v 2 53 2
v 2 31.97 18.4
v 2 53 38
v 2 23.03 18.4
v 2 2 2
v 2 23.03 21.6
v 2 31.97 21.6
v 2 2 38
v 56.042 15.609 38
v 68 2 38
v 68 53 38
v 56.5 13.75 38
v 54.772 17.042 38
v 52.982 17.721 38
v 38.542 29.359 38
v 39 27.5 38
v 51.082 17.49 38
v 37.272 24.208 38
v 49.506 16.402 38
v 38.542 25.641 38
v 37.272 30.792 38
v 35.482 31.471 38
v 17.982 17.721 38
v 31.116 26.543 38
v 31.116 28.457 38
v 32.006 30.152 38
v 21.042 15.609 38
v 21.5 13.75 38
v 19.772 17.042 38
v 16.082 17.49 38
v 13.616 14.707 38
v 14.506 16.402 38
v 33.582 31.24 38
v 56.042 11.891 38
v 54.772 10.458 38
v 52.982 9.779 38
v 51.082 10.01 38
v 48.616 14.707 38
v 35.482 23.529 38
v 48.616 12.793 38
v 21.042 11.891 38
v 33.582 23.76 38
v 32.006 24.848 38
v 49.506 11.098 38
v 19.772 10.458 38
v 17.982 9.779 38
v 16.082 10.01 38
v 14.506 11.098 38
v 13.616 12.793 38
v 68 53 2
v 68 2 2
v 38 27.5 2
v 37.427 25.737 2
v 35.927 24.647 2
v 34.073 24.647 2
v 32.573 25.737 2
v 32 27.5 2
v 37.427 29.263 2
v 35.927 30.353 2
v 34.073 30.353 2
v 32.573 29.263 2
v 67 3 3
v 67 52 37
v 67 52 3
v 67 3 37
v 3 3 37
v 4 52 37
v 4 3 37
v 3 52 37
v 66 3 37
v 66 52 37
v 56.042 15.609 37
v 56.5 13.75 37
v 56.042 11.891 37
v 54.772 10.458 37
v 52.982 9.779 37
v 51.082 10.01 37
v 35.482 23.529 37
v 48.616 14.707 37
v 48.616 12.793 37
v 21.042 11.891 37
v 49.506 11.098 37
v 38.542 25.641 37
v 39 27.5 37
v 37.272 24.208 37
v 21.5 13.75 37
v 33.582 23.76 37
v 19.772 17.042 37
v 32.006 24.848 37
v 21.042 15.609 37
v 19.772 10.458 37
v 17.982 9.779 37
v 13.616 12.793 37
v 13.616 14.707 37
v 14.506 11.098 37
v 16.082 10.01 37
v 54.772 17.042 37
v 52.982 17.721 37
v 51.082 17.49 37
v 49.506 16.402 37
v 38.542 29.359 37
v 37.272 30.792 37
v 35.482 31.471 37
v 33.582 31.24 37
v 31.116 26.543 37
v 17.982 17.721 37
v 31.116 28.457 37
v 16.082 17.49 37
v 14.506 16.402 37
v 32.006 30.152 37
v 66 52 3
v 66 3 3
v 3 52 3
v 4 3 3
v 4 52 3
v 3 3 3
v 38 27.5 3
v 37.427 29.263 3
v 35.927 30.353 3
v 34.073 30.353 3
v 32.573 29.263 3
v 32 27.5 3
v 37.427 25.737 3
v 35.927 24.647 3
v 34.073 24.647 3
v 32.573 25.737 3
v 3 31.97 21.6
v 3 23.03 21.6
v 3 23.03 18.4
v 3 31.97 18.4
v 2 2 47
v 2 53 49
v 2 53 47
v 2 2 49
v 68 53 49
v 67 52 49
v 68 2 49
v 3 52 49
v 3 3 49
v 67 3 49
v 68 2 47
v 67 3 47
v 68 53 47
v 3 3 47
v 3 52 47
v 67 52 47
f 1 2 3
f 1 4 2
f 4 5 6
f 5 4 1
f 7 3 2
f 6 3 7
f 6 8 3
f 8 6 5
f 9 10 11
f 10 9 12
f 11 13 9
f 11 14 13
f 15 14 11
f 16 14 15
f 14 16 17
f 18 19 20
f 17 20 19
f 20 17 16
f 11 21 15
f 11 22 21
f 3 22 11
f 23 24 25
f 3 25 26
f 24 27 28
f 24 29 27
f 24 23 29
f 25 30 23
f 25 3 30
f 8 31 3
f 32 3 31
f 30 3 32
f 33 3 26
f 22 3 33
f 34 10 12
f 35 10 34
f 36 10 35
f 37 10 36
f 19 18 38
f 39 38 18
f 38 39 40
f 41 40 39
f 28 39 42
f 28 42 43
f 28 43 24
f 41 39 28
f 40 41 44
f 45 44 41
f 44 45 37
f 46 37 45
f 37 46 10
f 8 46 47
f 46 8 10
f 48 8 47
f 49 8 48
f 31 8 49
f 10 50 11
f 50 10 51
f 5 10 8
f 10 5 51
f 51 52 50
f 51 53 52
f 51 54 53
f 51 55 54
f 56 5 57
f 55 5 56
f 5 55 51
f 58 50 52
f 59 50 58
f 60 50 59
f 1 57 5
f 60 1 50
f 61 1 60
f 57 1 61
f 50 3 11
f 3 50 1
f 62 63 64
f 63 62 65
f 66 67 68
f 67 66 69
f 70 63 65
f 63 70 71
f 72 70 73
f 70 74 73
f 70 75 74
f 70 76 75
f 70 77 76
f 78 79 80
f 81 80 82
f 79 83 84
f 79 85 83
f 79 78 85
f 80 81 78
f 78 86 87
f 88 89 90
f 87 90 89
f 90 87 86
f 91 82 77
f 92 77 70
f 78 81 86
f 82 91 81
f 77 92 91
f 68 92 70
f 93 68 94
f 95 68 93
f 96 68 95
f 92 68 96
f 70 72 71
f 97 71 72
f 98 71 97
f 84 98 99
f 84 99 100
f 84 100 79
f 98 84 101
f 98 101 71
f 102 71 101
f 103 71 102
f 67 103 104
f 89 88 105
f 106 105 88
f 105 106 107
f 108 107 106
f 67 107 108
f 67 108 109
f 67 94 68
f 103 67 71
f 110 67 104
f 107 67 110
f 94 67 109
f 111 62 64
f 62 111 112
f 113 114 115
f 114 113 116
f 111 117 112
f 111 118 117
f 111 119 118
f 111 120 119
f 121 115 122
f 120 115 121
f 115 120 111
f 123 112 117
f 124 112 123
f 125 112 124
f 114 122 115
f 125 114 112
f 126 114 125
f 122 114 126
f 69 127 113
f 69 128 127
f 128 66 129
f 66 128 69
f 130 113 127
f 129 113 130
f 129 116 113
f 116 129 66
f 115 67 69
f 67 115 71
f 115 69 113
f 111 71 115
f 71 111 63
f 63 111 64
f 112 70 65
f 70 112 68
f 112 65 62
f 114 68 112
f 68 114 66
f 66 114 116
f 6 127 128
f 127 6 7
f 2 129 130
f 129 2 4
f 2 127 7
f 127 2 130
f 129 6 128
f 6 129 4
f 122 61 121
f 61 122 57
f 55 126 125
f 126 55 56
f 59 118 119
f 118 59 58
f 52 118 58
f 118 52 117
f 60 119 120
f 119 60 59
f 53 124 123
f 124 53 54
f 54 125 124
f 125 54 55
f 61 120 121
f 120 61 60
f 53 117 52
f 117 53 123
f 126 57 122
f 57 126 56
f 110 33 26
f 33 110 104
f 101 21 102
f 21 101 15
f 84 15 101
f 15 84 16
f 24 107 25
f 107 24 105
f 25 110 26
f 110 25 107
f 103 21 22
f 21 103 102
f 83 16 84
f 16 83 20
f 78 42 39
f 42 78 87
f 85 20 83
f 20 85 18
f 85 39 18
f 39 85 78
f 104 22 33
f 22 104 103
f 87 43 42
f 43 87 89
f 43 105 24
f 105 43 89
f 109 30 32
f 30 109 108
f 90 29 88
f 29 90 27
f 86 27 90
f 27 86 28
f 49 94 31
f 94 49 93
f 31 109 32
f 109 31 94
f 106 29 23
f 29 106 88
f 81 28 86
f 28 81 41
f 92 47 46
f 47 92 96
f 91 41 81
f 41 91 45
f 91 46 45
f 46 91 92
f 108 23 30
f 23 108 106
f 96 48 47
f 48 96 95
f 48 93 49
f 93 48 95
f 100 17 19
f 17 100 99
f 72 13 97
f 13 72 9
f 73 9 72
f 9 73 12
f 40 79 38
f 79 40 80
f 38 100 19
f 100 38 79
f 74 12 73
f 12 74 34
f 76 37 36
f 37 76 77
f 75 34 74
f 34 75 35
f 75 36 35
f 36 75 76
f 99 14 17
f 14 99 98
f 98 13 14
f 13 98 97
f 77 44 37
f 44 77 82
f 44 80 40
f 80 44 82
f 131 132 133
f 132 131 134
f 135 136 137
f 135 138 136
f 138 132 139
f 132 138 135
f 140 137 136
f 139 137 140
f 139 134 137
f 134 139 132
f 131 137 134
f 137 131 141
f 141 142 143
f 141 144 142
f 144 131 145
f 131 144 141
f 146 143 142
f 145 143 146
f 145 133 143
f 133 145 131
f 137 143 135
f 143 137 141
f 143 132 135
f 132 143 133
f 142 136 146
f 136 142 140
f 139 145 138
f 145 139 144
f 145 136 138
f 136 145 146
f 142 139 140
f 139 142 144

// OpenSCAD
// Mosswick — Garden Frog (SENSE Engine)
// Parametric enclosure for snap-in assembly
// JLC3DP MJF Nylon, green dye

// Parameters
engine = "SENSE";
product = "Mosswick";
character = "frog";
colour = "green";

// Electronics dimensions (fixed)
esp32_width = 25.8;
esp32_length = 50.8;
esp32_height = 3.6;

sensor_diameter = 12;  // DHT22
light_window = 8;      // BH1750

// Enclosure dimensions (within constraints)
width = 70;
length = 55;
height = 40;
wall = 2.0;

// Snap-fit rails
rail_depth = 2;
rail_lip = 1;

// USB-C port
usbc_width = 8.94;
usbc_height = 3.2;

// Sensor holes
moisture_hole = 6;  // For sensor probe
led_window = 5;     // For WS2812B

// Character features
frog_eye_diameter = 8;
frog_mouth_width = 15;

// Main body
module frog_body() {
    difference() {
        // Outer shell (rounded box)
        hull() {
            translate([wall, wall, wall])
                cube([width-2*wall, length-2*wall, height-2*wall]);
        }
        
        // Inner cavity
        translate([wall+rail_lip, wall+rail_lip, wall+rail_lip])
            cube([width-2*wall-2*rail_lip, length-2*wall-2*rail_lip, height-2*wall-2*rail_lip]);
        
        // USB-C port
        translate([-1, length/2-usbc_width/2, height/2-usbc_height/2])
            cube([wall+2, usbc_width, usbc_height]);
        
        // Moisture sensor hole (bottom)
        translate([width/2, length/2, -1])
            cylinder(d=moisture_hole, h=wall+2);
        
        // LED window (front)
        translate([width/2, -1, height/3])
            cylinder(d=led_window, h=wall+2);
        
        // Light window (top)
        translate([width/2, length/2, height-wall-1])
            cylinder(d=light_window, h=wall+2);
        
        // Frog eyes
        translate([width/4, length/4, height-wall-1])
            cylinder(d=frog_eye_diameter, h=wall+2);
        translate([3*width/4, length/4, height-wall-1])
            cylinder(d=frog_eye_diameter, h=wall+2);
        
        // Frog mouth
        translate([width/2, length/4, height/2])
            rotate([90, 0, 0])
                cylinder(d=frog_mouth_width, h=wall+2);
    }
}

// Snap-fit rails
module snap_rails() {
    // Bottom rails
    translate([wall, wall, wall])
        cube([rail_depth, length-2*wall, rail_lip]);
    translate([width-wall-rail_depth, wall, wall])
        cube([rail_depth, length-2*wall, rail_lip]);
    
    // Top rails
    translate([wall, wall, height-wall-rail_lip])
        cube([rail_depth, length-2*wall, rail_lip]);
    translate([width-wall-rail_depth, wall, height-wall-rail_lip])
        cube([rail_depth, length-2*wall, rail_lip]);
}

// Lid
module frog_lid() {
    difference() {
        // Outer shell
        hull() {
            translate([wall, wall, wall])
                cube([width-2*wall, length-2*wall, wall]);
        }
        
        // Inner cavity
        translate([wall+rail_lip, wall+rail_lip, wall])
            cube([width-2*wall-2*rail_lip, length-2*wall-2*rail_lip, wall]);
    }
}

// Assembly
module mosswick() {
    // Bottom half
    frog_body();
    snap_rails();
    
    // Lid (offset for visualization)
    translate([0, 0, height+5])
        frog_lid();
}

// Generate STL
mosswick();
